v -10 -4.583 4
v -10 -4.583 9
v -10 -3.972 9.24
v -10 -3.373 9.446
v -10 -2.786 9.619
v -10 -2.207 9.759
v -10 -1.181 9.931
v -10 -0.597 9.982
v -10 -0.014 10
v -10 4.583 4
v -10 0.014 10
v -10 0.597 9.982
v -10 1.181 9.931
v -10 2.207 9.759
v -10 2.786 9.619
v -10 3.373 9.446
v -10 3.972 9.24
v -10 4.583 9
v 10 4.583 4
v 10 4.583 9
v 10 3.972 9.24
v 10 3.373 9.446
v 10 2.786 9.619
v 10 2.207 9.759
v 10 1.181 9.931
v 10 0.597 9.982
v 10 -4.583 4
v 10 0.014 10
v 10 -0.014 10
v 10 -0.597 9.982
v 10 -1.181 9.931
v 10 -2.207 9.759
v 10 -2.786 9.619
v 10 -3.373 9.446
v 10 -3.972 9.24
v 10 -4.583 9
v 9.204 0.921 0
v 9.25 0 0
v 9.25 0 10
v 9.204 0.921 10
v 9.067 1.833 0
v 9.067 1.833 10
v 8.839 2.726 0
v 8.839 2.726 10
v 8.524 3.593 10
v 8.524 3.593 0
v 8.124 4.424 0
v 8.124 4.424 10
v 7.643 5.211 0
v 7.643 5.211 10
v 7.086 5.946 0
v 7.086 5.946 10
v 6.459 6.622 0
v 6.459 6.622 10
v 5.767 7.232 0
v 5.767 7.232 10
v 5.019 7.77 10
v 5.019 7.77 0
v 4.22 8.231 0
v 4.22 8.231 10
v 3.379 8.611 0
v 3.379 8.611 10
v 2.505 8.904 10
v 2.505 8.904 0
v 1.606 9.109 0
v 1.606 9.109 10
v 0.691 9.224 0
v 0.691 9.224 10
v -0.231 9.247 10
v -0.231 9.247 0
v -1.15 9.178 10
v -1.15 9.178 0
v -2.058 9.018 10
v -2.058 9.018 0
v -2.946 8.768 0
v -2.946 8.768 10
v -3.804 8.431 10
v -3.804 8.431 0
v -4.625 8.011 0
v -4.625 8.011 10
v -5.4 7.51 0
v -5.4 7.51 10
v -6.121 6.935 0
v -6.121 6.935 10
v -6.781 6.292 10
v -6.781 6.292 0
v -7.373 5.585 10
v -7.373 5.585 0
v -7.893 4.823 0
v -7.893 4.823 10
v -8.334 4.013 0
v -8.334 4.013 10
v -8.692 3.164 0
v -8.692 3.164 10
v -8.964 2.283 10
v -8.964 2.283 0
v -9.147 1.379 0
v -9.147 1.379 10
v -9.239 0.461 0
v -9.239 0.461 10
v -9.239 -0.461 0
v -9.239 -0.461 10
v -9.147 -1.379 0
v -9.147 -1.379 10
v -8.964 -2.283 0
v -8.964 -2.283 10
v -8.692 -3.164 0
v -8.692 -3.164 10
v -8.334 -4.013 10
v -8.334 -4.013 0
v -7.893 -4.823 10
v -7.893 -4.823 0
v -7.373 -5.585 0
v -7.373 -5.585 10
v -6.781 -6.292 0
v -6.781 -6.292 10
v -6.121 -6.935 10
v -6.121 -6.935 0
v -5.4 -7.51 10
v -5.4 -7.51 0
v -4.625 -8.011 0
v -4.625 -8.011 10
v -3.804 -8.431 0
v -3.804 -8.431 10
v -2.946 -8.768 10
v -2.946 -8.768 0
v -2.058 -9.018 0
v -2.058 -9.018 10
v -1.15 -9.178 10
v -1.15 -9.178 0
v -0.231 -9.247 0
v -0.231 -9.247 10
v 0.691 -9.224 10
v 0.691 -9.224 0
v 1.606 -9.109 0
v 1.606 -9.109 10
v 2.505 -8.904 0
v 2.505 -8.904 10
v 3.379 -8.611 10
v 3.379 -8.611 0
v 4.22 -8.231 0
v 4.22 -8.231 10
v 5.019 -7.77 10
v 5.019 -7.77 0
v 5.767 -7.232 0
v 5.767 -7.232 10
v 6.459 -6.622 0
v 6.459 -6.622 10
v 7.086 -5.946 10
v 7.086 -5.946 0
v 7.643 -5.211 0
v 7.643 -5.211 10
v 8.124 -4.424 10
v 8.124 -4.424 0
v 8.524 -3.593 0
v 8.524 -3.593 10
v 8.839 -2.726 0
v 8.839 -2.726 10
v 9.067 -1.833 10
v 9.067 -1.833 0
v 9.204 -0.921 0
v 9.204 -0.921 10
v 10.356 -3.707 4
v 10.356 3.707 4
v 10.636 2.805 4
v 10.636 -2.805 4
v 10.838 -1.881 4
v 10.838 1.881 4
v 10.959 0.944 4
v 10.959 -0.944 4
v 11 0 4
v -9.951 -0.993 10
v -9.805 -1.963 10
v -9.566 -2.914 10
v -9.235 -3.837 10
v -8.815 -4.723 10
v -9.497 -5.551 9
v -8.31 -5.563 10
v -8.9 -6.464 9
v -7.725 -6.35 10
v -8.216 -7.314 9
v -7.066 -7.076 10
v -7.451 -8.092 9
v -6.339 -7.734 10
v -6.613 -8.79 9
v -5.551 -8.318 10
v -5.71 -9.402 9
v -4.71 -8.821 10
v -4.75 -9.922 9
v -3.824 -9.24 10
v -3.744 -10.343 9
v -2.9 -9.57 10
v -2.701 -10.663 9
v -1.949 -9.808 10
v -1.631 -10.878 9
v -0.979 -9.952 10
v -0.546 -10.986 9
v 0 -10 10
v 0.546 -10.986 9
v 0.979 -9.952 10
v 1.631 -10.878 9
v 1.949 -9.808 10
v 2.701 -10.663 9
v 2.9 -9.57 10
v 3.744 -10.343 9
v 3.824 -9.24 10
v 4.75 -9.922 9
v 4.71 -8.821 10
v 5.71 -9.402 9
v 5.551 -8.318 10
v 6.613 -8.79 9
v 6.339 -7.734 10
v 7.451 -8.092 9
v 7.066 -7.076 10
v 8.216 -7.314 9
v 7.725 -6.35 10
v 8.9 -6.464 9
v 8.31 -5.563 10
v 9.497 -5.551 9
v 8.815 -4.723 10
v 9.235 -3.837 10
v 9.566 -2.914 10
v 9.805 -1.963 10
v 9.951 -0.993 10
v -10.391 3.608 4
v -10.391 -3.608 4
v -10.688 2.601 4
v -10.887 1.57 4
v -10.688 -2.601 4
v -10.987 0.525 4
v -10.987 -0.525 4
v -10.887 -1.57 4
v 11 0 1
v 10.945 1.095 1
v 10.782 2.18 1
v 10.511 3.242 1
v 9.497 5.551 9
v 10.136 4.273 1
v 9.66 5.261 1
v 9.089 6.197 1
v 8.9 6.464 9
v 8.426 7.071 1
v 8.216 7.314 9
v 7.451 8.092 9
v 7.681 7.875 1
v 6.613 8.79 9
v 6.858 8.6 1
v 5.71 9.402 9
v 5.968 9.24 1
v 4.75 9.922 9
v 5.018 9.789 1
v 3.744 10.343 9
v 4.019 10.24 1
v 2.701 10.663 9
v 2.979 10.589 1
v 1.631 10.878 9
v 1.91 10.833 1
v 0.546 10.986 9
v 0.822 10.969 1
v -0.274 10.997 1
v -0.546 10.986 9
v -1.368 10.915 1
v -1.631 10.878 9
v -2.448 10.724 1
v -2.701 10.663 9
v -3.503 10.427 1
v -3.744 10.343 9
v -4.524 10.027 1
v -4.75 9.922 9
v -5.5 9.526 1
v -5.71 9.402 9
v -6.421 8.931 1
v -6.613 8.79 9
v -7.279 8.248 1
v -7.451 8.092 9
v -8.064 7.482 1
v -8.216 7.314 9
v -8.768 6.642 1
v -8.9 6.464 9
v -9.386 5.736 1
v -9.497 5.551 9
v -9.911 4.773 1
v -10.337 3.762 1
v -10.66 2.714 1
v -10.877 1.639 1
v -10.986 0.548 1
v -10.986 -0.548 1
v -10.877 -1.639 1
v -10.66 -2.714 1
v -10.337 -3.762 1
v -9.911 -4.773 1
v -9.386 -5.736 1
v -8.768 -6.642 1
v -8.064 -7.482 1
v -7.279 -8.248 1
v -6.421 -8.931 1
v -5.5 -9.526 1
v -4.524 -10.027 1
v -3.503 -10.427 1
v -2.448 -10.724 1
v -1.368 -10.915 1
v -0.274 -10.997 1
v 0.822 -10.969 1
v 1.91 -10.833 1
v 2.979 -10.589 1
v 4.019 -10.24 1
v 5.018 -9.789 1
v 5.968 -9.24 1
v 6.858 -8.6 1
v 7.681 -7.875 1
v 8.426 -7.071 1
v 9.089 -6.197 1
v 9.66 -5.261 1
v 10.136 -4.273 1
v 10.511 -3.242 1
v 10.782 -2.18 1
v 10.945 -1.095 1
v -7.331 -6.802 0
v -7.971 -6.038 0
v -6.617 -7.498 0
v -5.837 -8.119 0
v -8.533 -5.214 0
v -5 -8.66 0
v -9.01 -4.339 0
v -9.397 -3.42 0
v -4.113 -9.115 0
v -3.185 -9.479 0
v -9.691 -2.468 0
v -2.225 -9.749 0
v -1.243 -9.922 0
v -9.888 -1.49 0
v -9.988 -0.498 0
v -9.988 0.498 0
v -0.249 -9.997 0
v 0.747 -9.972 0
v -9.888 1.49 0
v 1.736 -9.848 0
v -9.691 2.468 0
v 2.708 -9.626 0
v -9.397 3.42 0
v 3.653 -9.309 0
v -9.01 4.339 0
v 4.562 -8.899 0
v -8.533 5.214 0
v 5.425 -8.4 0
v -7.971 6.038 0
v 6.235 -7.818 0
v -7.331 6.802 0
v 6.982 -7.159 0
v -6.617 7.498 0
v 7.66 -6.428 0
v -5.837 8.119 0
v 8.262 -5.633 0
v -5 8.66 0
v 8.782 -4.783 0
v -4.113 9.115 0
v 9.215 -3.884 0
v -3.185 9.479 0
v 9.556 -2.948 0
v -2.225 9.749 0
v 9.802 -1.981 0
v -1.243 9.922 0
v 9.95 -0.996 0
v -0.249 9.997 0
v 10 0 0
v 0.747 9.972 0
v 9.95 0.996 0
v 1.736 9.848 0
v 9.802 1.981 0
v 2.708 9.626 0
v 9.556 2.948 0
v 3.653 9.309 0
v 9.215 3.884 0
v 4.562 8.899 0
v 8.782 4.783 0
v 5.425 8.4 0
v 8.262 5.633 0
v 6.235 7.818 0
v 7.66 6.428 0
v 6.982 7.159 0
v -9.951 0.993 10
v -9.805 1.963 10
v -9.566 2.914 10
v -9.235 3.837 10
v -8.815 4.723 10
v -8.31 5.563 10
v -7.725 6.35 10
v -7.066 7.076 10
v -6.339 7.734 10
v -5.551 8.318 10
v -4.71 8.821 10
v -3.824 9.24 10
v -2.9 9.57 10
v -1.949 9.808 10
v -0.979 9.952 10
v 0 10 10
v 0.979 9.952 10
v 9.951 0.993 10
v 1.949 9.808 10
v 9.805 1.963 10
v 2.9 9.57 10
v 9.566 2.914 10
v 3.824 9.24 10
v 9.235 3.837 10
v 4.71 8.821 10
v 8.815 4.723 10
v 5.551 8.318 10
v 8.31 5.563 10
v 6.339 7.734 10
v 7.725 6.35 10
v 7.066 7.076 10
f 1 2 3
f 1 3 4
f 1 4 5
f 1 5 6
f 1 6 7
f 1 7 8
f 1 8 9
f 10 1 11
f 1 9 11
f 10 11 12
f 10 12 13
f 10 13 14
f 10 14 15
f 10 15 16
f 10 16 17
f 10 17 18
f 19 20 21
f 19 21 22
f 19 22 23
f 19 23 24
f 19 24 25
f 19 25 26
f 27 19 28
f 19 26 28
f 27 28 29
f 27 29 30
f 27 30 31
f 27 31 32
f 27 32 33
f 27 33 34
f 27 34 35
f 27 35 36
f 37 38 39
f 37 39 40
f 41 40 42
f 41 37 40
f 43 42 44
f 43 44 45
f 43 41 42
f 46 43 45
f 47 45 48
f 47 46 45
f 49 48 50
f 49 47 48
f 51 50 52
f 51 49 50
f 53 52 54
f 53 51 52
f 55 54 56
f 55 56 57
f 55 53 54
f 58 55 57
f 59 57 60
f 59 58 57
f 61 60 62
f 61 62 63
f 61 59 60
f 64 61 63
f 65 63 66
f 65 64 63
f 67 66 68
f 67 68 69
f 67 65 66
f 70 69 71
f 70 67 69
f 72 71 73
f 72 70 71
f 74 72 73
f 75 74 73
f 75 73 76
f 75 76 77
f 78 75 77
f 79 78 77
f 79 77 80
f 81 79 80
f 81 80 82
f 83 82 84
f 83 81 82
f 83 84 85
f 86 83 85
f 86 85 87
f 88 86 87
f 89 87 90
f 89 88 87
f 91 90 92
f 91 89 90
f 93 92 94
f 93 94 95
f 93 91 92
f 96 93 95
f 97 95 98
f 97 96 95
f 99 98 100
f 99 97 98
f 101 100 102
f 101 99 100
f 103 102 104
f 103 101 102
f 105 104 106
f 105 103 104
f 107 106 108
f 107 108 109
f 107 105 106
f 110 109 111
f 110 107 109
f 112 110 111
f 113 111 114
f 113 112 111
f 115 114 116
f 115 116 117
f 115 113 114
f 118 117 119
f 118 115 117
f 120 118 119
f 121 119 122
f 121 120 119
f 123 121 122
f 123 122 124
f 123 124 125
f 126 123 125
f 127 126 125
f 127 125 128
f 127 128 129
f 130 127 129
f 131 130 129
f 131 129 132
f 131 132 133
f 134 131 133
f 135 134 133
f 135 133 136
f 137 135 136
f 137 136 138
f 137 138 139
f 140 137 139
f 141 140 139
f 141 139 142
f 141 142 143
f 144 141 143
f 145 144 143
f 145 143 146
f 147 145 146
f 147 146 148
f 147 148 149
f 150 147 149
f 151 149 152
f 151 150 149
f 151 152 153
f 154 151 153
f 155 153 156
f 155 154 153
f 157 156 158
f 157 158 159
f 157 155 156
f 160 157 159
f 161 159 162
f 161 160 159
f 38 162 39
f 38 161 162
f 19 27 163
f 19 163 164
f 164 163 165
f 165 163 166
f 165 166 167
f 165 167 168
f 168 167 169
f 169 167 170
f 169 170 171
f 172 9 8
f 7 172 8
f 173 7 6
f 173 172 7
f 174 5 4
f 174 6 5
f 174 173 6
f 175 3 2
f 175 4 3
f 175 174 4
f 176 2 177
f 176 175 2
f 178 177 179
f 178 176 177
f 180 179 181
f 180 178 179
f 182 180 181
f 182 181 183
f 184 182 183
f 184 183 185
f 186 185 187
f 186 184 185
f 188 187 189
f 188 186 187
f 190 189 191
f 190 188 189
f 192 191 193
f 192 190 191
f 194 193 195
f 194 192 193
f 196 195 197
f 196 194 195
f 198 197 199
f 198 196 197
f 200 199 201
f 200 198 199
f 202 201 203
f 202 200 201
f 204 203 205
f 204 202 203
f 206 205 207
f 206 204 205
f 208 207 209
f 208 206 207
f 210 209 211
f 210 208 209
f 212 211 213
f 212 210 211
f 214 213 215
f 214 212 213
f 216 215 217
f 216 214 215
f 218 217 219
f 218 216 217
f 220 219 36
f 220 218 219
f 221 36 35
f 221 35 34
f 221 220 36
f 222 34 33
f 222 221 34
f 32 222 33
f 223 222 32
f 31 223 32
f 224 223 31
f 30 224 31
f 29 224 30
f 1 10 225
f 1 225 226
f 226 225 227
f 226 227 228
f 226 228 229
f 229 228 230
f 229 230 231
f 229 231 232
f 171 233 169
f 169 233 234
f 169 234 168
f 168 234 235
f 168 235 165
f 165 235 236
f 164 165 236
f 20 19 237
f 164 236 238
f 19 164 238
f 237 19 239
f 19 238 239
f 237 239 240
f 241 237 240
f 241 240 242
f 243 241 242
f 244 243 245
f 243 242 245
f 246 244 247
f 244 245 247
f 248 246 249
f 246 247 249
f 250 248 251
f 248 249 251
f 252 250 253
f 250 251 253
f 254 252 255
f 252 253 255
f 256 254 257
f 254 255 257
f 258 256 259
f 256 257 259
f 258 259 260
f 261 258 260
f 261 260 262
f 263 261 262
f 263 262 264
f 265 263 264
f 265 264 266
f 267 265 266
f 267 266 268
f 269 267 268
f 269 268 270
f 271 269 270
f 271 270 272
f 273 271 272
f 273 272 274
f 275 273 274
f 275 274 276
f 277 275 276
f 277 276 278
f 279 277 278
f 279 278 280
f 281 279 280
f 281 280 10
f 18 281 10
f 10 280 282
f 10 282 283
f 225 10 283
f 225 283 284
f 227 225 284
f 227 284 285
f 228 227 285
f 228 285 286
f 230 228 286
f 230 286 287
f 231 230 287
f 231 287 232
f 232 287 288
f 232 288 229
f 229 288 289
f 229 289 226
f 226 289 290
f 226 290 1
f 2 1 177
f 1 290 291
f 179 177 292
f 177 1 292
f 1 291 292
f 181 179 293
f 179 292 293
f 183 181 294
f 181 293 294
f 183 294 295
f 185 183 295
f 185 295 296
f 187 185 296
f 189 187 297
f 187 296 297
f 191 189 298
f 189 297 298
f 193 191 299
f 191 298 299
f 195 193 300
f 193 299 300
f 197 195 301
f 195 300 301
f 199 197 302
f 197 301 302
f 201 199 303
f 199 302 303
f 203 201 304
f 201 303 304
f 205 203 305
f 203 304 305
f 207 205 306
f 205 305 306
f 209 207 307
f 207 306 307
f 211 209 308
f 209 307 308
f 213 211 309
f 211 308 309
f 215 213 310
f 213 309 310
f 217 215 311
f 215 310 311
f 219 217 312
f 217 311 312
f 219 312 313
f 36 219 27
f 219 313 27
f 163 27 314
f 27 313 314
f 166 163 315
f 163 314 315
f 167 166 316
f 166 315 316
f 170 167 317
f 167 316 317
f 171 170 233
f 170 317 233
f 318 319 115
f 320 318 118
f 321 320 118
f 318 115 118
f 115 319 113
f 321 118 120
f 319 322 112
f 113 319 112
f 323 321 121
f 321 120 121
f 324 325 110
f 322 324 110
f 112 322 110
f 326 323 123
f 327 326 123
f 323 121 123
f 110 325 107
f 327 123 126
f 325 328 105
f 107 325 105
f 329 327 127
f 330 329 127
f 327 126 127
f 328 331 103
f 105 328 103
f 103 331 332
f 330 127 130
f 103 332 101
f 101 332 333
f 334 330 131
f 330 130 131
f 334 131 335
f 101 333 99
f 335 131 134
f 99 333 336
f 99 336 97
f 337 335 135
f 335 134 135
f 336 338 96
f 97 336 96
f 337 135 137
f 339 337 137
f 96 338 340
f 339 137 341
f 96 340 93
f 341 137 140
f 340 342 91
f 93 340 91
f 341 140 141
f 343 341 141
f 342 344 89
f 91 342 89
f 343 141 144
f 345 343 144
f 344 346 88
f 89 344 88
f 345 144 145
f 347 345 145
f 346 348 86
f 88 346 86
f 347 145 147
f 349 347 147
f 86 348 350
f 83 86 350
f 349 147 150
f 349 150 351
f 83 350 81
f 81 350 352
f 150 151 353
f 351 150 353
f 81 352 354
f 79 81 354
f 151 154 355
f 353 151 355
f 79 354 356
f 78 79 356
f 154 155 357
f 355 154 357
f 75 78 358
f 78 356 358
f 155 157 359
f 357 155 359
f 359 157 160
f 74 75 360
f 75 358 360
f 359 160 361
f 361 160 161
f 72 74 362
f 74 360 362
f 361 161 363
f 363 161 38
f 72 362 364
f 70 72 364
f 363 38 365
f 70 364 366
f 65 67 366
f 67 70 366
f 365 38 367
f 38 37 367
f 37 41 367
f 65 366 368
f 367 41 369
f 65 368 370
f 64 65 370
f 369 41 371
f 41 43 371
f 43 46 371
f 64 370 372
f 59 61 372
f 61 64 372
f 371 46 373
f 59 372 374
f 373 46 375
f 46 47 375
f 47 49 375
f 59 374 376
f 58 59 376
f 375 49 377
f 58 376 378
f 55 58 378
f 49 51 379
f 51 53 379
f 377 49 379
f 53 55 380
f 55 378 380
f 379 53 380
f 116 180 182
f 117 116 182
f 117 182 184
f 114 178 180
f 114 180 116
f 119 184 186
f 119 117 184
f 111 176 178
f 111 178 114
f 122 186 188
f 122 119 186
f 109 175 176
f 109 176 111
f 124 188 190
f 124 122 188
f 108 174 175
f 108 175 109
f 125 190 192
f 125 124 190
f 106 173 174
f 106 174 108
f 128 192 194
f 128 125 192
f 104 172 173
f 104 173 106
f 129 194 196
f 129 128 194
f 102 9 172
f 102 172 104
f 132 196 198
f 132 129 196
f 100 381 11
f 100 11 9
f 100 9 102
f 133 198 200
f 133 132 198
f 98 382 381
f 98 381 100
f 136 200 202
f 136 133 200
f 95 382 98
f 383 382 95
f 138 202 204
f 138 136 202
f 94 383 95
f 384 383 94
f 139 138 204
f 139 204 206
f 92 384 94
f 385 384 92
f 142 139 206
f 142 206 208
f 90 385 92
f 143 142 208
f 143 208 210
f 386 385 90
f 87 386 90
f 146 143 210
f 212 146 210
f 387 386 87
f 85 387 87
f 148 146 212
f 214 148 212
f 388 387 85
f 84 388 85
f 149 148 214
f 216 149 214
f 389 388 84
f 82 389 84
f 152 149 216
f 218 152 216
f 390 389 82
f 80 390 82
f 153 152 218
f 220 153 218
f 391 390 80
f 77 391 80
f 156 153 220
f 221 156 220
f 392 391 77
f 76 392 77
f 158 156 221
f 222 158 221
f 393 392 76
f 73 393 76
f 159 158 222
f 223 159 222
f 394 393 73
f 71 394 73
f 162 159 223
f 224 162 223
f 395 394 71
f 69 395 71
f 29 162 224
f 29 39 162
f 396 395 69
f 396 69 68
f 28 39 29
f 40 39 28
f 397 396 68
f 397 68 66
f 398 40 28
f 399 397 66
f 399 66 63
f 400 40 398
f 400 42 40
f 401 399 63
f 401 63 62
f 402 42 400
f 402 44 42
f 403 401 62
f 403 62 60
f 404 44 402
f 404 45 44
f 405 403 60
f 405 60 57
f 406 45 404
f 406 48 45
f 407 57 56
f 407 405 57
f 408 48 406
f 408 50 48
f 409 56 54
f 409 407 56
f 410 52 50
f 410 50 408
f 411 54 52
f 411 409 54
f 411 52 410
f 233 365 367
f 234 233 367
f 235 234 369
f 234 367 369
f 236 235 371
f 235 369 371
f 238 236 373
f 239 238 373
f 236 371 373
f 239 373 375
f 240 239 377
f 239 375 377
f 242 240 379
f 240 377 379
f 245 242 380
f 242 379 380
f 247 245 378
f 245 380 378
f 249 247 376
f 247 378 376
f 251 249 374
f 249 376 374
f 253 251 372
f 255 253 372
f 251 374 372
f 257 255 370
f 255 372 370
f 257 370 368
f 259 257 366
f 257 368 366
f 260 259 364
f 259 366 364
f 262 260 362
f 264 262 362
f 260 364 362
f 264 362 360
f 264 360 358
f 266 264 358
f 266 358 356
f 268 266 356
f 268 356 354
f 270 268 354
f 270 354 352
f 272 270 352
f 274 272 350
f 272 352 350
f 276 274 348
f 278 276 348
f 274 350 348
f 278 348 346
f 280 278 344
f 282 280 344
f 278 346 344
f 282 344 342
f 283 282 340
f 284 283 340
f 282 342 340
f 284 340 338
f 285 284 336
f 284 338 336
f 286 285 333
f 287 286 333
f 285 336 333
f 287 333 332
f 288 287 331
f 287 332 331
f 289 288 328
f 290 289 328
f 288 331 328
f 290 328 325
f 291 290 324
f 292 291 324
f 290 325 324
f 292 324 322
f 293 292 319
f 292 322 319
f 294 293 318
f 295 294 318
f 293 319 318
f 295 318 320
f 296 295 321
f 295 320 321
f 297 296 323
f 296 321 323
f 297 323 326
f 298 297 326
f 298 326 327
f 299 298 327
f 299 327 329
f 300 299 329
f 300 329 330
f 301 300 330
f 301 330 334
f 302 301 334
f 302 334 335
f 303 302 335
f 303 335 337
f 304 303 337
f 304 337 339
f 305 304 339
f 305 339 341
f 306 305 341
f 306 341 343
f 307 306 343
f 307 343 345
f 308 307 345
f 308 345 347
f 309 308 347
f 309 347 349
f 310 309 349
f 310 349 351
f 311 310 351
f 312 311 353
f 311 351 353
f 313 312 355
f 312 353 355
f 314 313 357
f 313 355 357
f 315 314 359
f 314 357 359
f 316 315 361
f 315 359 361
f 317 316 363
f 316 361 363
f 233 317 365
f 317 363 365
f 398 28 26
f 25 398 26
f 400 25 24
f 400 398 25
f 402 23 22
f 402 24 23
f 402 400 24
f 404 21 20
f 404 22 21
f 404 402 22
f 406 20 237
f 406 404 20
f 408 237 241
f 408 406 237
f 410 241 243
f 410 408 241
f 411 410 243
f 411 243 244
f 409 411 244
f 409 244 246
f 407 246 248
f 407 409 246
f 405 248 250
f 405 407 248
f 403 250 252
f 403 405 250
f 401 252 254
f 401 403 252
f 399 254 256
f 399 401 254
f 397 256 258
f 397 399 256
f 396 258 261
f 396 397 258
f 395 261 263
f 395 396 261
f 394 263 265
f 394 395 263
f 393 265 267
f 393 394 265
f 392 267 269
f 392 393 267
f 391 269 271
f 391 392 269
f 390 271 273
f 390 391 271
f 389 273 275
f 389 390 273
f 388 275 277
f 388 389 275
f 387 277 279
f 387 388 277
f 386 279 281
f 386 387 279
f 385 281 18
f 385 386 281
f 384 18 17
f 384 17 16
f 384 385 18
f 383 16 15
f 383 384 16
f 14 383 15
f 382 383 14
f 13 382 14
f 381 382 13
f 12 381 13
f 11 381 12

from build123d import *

# Parameters (mm, degrees)
F0_R     = 11
F0_R_2   = 9.25
F1_DEPTH = 10
F3_DEPTH = 6
F4_SIZE  = 0.99999


# Not quite as in the source:
# - a fillet or chamfer is up to 0.001 mm smaller than in the source, because OpenCascade refuses the exact size


with BuildPart() as f1:
    # F0 (on Top) → F1 (new body)
    with BuildSketch(Plane.XY):
        Circle(F0_R)
        Circle(F0_R_2, mode=Mode.SUBTRACT)
    extrude(amount=F1_DEPTH)

    # F2 (on face) → F3 (cut)
    with BuildSketch(Plane.XY.offset(10)):
        with BuildLine():
            Line((-10, -4.582575695), (-10, 4.582575695))
            ThreePointArc((-10, 4.582575695), (-11, 0), (-10, -4.582575695))
        make_face()
        with BuildLine():
            ThreePointArc((11, 0), (10.7470926301, 2.3452078799), (10, 4.582575695))
            Line((10, 4.582575695), (10, -4.582575695))
            ThreePointArc((10, -4.582575695), (10.7470926301, -2.3452078799), (11, 0))
        make_face()
    extrude(amount=-F3_DEPTH, mode=Mode.SUBTRACT)

    # F4 (size 1 in the source; OpenCascade refuses exactly that, so slightly less here)
    f4_edges = [f1.edges().sort_by_distance(p)[0] for p in [
        (-11, 0, 0),
        (0, -11, 10),
        (0, 11, 10),
    ]]
    chamfer(f4_edges, length=F4_SIZE)


solid = f1.part
